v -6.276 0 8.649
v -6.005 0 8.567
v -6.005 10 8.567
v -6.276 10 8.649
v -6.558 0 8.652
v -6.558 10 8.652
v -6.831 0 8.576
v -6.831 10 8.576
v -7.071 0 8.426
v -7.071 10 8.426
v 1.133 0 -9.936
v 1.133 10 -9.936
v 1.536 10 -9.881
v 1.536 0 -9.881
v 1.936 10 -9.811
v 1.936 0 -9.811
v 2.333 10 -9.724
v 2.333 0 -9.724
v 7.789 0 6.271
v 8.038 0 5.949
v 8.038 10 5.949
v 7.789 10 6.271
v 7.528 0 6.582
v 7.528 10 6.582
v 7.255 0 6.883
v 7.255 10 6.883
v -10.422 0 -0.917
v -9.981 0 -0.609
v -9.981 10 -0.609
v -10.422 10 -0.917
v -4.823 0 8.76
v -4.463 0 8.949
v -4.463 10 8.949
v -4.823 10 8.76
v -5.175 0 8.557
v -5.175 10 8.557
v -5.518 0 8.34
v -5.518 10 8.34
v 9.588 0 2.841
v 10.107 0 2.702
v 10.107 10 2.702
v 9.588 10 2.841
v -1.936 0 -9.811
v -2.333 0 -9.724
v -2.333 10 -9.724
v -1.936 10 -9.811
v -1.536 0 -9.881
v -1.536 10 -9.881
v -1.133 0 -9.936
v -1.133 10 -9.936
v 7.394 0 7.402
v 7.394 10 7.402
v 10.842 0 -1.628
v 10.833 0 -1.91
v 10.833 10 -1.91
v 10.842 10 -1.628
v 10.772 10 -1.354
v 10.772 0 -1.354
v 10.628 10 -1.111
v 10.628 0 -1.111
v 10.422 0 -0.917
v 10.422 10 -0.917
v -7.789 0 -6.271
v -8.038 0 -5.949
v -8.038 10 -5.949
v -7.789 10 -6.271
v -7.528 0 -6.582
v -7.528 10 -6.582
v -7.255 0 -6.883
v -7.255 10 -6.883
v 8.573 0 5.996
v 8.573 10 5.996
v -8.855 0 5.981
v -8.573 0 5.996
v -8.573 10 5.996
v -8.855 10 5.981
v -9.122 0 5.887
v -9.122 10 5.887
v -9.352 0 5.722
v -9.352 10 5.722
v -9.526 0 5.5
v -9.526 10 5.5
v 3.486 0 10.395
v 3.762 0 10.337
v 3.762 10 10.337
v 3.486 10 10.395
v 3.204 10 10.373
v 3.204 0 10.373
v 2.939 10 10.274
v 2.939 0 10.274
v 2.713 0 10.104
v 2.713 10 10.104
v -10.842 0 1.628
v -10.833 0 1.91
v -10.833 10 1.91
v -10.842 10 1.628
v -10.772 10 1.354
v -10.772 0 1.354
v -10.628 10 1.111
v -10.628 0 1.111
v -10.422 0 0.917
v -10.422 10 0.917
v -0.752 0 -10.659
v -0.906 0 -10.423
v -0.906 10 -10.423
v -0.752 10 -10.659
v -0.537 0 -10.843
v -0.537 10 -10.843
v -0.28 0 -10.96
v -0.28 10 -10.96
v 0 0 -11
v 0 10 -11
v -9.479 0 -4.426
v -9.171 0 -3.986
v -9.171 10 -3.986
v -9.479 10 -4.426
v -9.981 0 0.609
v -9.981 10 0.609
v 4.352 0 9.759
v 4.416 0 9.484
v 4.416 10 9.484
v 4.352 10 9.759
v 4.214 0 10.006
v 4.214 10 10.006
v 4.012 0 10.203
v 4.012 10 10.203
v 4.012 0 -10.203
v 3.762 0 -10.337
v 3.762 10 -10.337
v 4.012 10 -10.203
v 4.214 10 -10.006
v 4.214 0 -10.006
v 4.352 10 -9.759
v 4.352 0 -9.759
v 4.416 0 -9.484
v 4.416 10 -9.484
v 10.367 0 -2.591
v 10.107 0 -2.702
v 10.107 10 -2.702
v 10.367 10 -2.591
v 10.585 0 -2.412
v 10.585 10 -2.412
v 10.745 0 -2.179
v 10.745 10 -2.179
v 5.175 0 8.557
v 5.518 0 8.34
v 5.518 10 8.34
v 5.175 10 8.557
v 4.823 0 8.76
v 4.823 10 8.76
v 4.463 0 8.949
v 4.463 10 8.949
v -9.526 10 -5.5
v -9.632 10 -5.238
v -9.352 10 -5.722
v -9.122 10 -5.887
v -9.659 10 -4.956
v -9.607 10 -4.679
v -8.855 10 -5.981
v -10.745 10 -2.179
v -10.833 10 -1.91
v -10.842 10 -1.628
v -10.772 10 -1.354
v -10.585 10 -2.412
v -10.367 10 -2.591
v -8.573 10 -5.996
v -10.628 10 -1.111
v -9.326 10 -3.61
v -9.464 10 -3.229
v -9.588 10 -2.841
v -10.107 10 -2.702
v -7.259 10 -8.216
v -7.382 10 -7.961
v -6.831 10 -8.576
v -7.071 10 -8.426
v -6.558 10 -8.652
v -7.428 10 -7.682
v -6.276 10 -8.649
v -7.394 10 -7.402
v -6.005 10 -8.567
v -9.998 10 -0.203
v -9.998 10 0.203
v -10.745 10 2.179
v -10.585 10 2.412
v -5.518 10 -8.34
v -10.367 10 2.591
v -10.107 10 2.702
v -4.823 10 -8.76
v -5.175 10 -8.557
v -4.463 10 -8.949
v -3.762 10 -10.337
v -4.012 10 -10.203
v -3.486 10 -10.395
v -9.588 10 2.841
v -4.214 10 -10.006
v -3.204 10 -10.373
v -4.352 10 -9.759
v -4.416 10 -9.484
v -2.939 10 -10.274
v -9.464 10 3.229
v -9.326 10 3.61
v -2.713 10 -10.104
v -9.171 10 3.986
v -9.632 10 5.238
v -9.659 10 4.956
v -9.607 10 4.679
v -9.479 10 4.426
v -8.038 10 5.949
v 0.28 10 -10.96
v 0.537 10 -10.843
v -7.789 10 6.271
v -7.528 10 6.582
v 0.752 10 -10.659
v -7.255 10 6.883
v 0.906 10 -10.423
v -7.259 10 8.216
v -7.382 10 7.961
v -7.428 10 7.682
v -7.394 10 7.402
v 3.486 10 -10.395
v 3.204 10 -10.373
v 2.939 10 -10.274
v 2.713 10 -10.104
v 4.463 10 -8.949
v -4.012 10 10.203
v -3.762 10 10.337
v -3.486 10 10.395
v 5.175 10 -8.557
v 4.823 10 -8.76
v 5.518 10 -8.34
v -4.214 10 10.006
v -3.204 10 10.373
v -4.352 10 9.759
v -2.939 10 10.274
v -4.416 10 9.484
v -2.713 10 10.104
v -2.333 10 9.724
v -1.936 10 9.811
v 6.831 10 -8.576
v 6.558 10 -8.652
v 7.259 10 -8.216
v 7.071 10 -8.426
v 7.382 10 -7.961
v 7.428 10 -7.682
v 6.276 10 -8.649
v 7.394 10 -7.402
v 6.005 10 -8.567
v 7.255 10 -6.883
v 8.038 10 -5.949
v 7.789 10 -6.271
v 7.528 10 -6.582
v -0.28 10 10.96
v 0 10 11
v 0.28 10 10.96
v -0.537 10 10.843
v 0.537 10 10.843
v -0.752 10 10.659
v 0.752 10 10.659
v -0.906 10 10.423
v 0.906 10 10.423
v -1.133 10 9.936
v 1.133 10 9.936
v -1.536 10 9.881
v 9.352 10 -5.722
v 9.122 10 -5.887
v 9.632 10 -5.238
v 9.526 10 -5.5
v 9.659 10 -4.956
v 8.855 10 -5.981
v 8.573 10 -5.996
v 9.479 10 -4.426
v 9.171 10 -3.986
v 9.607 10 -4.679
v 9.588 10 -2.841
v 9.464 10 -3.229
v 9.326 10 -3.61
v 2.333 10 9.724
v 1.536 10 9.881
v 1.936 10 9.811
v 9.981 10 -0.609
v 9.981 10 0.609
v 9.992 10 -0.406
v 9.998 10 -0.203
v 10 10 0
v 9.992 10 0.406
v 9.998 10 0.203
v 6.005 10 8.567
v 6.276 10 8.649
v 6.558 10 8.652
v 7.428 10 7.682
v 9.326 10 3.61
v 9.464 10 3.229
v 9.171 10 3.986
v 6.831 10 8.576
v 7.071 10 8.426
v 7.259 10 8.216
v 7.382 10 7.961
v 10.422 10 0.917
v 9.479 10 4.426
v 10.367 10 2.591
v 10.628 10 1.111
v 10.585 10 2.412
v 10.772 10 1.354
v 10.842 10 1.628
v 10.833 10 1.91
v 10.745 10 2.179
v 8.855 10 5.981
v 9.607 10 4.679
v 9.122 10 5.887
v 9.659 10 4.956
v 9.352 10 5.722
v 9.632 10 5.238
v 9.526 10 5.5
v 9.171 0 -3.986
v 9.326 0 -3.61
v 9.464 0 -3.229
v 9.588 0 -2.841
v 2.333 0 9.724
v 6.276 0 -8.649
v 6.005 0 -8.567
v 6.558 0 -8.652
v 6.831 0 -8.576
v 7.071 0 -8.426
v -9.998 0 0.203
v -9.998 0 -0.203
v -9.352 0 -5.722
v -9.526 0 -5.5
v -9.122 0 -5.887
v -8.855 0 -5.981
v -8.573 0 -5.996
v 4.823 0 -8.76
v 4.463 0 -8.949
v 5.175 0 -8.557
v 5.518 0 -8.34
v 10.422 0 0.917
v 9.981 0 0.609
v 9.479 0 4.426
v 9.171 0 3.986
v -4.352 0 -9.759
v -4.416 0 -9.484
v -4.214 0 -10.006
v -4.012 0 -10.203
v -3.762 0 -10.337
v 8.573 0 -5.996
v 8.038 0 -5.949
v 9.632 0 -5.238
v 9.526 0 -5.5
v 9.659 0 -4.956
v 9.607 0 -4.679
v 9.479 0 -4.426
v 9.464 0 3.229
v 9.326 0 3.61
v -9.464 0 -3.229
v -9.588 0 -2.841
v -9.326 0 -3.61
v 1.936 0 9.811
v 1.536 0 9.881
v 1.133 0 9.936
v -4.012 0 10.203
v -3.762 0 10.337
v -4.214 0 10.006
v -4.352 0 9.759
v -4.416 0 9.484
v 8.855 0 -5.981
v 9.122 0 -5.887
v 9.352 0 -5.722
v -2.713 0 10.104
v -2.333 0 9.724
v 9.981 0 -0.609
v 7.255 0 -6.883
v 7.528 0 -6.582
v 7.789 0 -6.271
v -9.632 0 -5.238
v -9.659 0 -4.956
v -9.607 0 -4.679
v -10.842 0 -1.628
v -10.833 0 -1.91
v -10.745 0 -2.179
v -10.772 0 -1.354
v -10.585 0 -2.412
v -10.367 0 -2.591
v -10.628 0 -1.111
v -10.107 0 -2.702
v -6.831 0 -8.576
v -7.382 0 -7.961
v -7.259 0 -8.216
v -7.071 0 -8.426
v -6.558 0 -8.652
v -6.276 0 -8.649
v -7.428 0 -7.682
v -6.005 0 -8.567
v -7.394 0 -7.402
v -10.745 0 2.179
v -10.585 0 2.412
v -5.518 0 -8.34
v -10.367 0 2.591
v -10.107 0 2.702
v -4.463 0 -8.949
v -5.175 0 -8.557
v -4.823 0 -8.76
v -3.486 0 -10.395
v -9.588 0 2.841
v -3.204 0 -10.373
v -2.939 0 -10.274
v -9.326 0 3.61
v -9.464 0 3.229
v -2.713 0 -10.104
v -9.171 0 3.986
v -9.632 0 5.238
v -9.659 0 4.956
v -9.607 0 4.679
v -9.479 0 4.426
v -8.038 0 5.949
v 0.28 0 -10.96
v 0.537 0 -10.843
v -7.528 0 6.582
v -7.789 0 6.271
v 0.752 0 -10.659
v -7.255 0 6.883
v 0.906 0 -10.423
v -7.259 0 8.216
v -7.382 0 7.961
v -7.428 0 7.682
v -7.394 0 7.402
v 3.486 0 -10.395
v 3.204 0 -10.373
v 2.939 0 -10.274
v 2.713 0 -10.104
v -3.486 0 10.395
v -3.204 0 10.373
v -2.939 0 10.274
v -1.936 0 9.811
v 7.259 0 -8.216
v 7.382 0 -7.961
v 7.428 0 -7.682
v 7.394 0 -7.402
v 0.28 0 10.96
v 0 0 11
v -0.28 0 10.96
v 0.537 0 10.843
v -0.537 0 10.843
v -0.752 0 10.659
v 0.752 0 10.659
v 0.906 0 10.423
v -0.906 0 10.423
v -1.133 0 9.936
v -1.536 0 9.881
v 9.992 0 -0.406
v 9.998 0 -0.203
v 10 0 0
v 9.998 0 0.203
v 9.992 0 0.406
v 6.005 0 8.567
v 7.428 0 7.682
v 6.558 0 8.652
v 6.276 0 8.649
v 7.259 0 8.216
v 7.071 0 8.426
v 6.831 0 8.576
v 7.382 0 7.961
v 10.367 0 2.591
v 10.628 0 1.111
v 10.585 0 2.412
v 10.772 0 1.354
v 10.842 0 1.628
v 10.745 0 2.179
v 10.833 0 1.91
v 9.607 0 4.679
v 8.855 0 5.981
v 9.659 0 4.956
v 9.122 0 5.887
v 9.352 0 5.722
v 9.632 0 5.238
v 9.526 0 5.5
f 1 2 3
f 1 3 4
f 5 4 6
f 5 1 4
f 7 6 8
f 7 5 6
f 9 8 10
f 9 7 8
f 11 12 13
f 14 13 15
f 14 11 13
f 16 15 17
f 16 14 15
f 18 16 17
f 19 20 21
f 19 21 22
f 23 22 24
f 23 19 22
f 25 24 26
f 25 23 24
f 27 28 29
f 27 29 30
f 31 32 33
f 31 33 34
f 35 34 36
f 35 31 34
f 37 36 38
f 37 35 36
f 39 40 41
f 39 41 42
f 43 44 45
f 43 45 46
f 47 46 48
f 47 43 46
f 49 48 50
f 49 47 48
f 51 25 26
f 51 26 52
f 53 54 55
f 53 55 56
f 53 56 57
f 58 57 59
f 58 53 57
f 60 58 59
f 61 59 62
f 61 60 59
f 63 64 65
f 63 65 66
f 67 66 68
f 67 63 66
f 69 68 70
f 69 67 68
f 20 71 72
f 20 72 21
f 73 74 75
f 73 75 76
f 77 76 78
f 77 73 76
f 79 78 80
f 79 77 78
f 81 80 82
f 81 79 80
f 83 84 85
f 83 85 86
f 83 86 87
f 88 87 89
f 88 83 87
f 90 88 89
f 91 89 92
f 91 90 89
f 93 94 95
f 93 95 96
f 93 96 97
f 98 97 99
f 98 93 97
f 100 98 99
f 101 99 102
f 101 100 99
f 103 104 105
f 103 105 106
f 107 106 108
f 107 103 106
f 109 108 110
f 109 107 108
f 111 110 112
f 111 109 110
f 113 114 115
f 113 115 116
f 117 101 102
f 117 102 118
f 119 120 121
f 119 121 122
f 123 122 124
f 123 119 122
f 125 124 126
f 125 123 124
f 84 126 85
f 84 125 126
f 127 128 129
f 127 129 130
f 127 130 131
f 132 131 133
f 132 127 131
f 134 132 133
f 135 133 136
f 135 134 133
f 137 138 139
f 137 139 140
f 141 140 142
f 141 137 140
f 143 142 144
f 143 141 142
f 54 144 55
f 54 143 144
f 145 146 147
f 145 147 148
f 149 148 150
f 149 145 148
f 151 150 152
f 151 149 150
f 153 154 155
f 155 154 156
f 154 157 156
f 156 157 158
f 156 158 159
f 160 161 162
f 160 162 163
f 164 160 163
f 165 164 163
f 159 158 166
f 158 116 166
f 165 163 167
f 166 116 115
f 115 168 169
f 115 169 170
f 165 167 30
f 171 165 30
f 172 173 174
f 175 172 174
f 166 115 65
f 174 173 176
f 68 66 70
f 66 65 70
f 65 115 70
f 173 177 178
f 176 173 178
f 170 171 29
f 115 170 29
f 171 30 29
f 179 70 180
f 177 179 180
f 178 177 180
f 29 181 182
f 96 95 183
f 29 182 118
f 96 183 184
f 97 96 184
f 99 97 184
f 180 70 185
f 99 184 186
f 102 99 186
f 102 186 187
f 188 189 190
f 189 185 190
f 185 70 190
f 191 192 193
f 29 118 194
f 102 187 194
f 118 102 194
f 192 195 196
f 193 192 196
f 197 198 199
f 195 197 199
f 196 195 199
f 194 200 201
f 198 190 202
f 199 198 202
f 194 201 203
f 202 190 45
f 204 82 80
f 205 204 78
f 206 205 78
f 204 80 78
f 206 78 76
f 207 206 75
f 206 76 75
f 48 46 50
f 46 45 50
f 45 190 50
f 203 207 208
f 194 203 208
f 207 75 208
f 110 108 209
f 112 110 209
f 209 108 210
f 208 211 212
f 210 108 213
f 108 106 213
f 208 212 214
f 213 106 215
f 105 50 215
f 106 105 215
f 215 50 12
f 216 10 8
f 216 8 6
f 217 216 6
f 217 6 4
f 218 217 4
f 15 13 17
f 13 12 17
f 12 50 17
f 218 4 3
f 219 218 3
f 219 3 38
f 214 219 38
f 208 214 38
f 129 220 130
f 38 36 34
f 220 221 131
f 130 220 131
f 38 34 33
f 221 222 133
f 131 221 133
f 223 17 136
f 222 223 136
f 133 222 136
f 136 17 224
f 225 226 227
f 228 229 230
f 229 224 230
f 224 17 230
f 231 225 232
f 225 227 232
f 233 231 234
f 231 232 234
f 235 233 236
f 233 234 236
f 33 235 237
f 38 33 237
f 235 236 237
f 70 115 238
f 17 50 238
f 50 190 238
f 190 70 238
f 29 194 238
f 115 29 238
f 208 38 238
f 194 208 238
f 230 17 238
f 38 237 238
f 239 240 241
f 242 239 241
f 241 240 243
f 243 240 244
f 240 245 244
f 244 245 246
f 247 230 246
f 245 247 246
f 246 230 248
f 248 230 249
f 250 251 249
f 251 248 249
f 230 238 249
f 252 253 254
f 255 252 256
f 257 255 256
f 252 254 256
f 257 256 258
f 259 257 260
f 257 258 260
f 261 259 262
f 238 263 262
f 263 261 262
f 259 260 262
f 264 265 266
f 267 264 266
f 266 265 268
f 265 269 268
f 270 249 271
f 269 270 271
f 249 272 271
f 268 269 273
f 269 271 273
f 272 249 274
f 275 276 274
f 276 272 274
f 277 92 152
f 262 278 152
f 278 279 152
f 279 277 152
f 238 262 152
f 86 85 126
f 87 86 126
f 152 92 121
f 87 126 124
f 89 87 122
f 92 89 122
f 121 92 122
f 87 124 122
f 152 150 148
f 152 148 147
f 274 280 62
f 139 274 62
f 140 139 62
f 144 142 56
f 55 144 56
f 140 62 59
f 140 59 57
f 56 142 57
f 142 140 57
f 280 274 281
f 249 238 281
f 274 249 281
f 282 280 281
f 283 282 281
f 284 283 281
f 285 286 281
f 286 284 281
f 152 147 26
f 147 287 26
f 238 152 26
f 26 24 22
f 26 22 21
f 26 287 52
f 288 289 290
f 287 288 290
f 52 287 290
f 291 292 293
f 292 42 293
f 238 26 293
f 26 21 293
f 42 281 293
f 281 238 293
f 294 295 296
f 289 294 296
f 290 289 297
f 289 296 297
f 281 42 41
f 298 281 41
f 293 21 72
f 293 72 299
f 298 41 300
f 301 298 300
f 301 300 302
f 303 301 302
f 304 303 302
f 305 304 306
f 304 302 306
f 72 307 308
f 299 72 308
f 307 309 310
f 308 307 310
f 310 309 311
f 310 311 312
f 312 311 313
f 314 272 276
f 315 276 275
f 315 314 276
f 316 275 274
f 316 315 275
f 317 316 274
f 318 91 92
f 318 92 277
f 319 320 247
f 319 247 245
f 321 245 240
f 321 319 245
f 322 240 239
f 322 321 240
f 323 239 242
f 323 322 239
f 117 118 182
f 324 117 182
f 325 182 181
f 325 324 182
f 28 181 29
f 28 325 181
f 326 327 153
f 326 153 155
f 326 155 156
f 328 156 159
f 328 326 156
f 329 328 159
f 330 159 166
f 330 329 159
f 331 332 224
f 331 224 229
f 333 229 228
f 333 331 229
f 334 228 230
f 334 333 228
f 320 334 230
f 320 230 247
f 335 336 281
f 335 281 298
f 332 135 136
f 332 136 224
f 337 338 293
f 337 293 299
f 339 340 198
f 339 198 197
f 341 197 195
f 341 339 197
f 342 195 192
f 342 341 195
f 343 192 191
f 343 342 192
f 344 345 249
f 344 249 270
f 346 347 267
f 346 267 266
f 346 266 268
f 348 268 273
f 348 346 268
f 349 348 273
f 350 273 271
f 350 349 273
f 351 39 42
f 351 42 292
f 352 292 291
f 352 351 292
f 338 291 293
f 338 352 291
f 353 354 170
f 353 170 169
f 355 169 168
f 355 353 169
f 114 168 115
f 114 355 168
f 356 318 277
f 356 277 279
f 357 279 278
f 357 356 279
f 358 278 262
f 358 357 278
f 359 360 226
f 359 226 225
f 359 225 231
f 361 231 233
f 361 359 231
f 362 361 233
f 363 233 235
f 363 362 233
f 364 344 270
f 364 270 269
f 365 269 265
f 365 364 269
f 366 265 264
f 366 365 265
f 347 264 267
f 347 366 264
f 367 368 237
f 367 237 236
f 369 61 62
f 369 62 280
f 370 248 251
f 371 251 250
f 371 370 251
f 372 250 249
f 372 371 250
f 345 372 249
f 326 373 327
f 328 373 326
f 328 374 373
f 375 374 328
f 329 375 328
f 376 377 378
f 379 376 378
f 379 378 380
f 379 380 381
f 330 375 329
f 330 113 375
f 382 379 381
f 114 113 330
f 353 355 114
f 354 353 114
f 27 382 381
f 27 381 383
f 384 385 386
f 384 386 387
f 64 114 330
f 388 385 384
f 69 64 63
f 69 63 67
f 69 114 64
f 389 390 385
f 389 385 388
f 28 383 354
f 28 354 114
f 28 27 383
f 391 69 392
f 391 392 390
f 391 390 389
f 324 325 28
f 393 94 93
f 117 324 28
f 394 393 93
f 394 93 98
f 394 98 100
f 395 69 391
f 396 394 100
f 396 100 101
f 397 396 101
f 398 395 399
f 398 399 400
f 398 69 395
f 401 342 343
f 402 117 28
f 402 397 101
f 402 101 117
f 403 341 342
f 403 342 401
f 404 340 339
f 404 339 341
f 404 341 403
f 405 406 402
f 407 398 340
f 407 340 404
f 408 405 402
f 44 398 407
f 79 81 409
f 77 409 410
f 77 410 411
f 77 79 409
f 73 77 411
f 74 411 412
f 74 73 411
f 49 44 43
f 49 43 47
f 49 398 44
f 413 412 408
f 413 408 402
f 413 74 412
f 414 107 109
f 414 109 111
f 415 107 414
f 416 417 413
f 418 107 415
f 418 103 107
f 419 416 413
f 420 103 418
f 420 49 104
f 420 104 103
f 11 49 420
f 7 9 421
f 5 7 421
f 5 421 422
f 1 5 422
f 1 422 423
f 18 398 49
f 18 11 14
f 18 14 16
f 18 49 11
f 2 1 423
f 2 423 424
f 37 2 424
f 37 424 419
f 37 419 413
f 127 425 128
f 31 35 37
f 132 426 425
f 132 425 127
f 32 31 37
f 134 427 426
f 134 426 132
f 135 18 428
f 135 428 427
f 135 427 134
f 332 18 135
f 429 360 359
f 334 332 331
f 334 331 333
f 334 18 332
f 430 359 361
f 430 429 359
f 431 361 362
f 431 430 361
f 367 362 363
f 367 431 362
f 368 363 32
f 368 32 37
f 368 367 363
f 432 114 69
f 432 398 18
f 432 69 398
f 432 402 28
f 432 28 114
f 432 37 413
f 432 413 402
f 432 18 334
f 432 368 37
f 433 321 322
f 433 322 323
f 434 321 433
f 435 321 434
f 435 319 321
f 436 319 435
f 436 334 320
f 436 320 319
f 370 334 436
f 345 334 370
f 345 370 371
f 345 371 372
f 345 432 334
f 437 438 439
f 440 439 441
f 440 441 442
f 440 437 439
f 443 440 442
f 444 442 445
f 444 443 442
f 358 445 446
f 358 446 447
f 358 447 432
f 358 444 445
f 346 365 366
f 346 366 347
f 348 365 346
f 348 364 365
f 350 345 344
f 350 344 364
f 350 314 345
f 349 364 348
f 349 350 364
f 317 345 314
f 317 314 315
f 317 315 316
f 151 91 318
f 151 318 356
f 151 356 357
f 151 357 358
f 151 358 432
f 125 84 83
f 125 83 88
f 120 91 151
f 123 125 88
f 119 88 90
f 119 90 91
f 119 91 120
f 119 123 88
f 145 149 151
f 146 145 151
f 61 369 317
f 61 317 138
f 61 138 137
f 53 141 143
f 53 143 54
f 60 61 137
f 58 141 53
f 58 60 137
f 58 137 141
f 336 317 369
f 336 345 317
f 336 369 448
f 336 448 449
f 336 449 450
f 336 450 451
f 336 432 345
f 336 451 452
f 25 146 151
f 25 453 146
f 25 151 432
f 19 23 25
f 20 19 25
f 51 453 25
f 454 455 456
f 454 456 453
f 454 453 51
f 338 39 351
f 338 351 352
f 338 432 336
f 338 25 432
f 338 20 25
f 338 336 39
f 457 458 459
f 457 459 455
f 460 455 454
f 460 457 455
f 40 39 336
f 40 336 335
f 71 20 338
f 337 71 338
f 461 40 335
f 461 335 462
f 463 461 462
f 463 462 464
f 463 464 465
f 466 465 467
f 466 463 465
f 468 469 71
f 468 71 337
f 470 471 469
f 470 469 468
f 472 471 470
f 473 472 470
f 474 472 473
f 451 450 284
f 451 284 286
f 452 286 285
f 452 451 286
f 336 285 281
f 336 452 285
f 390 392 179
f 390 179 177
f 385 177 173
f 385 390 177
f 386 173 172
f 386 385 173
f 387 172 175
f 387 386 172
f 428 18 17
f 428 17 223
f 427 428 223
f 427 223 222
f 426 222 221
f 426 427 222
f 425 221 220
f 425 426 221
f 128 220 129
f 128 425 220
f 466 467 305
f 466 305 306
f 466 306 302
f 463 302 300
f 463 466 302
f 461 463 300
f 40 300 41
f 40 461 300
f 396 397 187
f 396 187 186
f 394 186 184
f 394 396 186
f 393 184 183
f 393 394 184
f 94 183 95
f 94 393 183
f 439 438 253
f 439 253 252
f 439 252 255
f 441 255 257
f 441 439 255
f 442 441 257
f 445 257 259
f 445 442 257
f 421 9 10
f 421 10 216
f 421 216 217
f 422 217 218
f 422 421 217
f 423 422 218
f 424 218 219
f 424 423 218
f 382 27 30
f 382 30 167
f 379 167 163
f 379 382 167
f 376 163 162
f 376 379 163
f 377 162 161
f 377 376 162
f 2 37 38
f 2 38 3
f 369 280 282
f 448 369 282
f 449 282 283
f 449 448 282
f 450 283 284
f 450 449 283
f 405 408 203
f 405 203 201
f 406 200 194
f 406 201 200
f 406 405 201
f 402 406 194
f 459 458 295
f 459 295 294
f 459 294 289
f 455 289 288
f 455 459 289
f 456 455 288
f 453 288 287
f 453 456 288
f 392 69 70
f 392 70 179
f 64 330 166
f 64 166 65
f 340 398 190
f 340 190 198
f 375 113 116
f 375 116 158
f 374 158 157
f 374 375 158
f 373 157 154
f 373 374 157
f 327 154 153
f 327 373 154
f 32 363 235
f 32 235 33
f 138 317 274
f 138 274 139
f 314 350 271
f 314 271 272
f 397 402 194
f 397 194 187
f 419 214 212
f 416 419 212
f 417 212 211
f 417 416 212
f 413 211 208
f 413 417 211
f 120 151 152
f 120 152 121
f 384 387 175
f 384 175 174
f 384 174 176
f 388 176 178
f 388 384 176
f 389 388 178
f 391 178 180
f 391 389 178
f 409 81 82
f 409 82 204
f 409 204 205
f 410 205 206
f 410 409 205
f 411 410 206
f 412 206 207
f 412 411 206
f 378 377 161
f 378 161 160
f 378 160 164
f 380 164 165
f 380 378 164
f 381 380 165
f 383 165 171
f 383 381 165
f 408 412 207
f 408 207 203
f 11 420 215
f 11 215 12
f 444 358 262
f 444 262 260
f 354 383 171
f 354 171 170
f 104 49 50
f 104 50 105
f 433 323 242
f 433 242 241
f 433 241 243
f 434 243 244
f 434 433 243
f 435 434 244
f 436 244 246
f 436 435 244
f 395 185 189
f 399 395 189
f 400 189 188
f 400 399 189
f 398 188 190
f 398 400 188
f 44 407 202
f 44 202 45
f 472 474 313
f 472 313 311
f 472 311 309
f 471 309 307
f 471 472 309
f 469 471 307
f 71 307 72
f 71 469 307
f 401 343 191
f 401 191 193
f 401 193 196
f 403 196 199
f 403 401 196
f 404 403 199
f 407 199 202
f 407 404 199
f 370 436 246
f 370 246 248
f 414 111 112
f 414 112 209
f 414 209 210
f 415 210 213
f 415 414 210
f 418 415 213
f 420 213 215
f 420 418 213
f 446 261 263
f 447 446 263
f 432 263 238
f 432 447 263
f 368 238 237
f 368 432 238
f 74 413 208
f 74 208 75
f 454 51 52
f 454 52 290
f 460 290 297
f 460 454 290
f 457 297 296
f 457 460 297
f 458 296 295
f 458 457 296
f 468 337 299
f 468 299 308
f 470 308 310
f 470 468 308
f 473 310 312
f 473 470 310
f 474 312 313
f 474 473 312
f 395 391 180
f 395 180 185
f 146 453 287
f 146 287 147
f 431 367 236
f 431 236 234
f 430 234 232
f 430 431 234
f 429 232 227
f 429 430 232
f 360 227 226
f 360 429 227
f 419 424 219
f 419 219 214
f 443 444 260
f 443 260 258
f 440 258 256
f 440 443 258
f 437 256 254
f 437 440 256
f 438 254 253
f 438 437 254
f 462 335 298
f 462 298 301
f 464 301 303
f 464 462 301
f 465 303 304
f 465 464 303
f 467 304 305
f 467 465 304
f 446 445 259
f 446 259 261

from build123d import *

# Parameters (mm, degrees)
F1_DEPTH = 10
F3_DEPTH = 10
F4_COUNT = 18


with BuildPart() as f1:
    # F0 (on Front) → F1 (new body)
    with BuildSketch(Plane.XZ):
        with BuildLine():
            ThreePointArc((-1.1334270023, 9.9355595328), (-6.6582929485, -7.461041148), (10, 0))
            ThreePointArc((10, 0), (7.461041148, 6.6582929485), (1.1334270023, 9.9355595328))
            ThreePointArc((1.1334270023, 9.9355595328), (0, 10), (-1.1334270023, 9.9355595328))
        make_face()
    extrude(amount=-F1_DEPTH)

    # F2 (on face) → F3 (join)
    with BuildSketch(Plane.XZ):
        with BuildLine():
            Line((-0.906307787, 10.4226182617), (-1.1334270023, 9.9355595328))
            ThreePointArc((-1.1334270023, 9.9355595328), (0, 9.5833893877), (1.1334270023, 9.9355595328))
            Line((1.1334270023, 9.9355595328), (0.906307787, 10.4226182617))
            ThreePointArc((0.906307787, 10.4226182617), (0.5372996083, 10.8433914458), (0, 11))
            ThreePointArc((0, 11), (-0.5372996083, 10.8433914458), (-0.906307787, 10.4226182617))
        make_face()
    extrude(amount=-F3_DEPTH)

    # F4: F1 ×18 about axis
    f4_axis = Axis((0, 0, 0), (0, -1, 0))


with BuildPart() as f1_1:
    add(f1.part)
    for i in range(1, F4_COUNT):
        add(f1.part.rotate(f4_axis, i * 360 / F4_COUNT))


solid = f1_1.part
